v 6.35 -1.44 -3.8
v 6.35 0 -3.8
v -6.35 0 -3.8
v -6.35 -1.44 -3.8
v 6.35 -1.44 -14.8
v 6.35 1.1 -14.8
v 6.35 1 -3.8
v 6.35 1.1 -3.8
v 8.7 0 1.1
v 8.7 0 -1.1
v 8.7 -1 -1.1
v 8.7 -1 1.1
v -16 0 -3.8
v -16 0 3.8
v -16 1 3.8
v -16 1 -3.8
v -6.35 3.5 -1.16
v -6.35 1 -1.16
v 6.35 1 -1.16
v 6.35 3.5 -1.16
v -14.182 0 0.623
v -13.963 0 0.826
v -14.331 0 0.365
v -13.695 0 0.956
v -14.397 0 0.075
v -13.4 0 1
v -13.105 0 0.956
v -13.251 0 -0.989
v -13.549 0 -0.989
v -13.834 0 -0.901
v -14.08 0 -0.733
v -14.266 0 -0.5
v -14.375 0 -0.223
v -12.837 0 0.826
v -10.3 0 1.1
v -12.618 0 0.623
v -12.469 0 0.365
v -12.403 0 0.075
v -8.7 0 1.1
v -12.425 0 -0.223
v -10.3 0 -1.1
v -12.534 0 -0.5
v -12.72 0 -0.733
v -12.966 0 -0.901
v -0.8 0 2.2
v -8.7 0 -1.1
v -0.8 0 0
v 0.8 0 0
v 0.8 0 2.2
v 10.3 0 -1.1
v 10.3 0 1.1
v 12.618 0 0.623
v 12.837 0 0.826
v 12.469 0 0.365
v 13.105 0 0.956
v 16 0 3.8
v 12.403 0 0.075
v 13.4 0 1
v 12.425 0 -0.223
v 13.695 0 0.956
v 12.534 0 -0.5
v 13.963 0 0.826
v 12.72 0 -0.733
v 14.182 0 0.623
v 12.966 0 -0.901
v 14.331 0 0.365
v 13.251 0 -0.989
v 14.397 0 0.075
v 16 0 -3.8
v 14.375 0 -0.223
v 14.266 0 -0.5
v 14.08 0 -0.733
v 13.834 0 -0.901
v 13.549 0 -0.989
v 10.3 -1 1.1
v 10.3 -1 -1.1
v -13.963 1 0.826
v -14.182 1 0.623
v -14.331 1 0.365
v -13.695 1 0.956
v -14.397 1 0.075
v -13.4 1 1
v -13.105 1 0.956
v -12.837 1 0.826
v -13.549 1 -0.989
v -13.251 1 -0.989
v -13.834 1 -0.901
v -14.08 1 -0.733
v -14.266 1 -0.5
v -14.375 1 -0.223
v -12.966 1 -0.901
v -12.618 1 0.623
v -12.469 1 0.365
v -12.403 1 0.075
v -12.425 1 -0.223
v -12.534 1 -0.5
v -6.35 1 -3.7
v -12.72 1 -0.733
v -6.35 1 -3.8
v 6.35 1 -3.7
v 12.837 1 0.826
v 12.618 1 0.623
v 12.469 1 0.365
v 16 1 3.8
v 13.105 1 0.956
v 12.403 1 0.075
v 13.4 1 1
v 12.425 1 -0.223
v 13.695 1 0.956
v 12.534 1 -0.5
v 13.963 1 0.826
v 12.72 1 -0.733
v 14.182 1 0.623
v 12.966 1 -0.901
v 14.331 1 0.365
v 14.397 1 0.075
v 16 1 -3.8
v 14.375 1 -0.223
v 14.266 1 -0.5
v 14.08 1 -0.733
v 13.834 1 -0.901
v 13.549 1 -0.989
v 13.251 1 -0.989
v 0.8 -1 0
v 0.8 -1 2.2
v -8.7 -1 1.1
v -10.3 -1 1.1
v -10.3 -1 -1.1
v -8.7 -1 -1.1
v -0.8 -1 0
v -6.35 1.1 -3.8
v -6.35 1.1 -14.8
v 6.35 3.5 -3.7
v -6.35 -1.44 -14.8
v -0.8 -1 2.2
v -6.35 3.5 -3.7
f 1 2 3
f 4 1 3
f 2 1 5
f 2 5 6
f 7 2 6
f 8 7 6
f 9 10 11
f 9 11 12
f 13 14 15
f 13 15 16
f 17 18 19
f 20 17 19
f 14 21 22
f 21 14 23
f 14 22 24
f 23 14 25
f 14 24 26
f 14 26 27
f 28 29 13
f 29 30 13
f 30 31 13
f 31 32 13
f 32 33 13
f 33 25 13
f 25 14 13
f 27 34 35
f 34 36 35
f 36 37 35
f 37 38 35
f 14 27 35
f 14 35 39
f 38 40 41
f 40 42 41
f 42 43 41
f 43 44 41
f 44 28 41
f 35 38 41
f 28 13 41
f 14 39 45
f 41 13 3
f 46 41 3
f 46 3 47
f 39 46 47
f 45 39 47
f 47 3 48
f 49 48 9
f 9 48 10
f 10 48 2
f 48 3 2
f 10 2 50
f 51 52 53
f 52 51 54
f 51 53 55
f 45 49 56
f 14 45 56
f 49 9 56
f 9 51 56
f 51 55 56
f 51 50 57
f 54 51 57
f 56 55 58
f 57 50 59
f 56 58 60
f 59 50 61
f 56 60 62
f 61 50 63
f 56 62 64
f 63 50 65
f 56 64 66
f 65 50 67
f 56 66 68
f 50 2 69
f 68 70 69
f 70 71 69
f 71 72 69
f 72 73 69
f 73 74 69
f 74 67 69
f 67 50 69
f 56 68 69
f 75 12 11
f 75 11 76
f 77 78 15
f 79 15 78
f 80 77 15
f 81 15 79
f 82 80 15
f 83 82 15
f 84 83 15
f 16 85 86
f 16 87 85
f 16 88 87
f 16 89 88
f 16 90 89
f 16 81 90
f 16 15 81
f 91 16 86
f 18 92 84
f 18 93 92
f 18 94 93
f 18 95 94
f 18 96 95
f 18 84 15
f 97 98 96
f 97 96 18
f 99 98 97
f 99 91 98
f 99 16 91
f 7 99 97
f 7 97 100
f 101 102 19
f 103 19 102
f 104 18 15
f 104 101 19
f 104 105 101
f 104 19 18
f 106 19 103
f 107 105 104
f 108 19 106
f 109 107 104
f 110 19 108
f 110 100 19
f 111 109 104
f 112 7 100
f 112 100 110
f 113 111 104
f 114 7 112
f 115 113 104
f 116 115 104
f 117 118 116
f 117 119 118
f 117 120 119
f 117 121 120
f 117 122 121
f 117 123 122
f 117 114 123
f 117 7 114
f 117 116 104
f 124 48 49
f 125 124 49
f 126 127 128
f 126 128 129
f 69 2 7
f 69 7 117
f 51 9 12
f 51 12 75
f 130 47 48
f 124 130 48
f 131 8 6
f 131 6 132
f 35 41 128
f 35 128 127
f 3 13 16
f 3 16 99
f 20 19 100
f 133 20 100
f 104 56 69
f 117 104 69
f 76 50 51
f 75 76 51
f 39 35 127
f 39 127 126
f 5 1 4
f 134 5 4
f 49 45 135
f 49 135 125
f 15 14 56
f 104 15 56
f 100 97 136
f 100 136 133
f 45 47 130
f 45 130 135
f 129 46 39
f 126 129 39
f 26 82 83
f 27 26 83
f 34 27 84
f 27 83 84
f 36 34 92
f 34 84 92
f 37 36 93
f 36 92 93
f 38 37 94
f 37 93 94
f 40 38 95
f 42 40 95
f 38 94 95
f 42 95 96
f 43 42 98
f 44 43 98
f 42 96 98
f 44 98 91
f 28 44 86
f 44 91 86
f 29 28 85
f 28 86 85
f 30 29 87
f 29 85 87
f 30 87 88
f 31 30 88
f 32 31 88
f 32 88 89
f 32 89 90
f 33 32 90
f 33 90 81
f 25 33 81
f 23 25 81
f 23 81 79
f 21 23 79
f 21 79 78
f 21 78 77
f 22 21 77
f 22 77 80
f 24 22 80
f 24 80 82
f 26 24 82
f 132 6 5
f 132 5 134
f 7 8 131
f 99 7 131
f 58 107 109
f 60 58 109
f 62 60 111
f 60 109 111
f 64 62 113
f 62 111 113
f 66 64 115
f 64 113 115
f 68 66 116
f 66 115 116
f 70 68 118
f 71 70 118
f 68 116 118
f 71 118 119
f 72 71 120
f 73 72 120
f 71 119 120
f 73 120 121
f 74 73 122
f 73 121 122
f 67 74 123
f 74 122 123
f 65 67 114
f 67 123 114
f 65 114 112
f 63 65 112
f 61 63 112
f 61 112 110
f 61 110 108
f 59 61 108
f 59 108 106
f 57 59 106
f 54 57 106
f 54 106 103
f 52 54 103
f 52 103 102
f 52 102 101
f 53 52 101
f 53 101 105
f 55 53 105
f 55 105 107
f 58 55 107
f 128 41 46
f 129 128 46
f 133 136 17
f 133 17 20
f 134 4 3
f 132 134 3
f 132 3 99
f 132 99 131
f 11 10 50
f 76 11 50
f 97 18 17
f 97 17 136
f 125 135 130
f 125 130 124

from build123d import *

# Parameters (mm, degrees)
SKETCH1_W           = 32
SKETCH1_H           = 7.6
BOSS_EXTRUDE1_DEPTH = 1
SKETCH2_R           = 1
CUT_EXTRUDE1_DEPTH  = 17.475436261
SKETCH3_W           = 1.6
SKETCH3_H           = 2.2
BOSS_EXTRUDE2_DEPTH = 1
SKETCH4_W           = 12.7
SKETCH4_H           = 2.54
BOSS_EXTRUDE3_DEPTH = 11
SKETCH5_W           = 12.7
SKETCH5_H           = 2.54
BOSS_EXTRUDE4_DEPTH = 2.5


with BuildPart() as part:
    # Sketch1 → Boss-Extrude1 (new body)
    with BuildSketch(Plane(origin=(0, 0, 0), x_dir=(1, 0, 0), z_dir=(0, 1, 0))):
        Rectangle(SKETCH1_W, SKETCH1_H)
    extrude(amount=BOSS_EXTRUDE1_DEPTH)

    # Sketch2 → Cut-Extrude1 (cut, through all)
    with BuildSketch(Plane(origin=(0, 1, 0), x_dir=(1, 0, 0), z_dir=(0, 1, 0))):
        with Locations(Location((-13.4, 0, 0), (0, 0, 270))):
            Circle(SKETCH2_R)
        with Locations(Location((13.4, 0, 0), (0, 0, 270))):
            Circle(SKETCH2_R)
    extrude(amount=-CUT_EXTRUDE1_DEPTH, mode=Mode.SUBTRACT)

    # Sketch3 → Boss-Extrude2 (add)
    with BuildSketch(Plane.XZ):
        with Locations((-9.5, 0)):
            Rectangle(SKETCH3_W, SKETCH3_H)
        with Locations((9.5, 0)):
            Rectangle(SKETCH3_W, SKETCH3_H)
        with Locations((0, 1.1)):
            Rectangle(SKETCH3_W, SKETCH3_H)
    extrude(amount=BOSS_EXTRUDE2_DEPTH)

    # Sketch4 → Boss-Extrude3 (add)
    with BuildSketch(Plane(origin=(0, 0, -3.8), x_dir=(-1, 0, 0), z_dir=(0, 0, -1))):
        with Locations((0, -0.17)):
            Rectangle(SKETCH4_W, SKETCH4_H)
    extrude(amount=BOSS_EXTRUDE3_DEPTH)

    # Sketch5 → Boss-Extrude4 (add)
    with BuildSketch(Plane(origin=(0, 1, 0), x_dir=(1, 0, 0), z_dir=(0, 1, 0))):
        with Locations((0, 2.43)):
            Rectangle(SKETCH5_W, SKETCH5_H)
    extrude(amount=BOSS_EXTRUDE4_DEPTH)


solid = part.part
